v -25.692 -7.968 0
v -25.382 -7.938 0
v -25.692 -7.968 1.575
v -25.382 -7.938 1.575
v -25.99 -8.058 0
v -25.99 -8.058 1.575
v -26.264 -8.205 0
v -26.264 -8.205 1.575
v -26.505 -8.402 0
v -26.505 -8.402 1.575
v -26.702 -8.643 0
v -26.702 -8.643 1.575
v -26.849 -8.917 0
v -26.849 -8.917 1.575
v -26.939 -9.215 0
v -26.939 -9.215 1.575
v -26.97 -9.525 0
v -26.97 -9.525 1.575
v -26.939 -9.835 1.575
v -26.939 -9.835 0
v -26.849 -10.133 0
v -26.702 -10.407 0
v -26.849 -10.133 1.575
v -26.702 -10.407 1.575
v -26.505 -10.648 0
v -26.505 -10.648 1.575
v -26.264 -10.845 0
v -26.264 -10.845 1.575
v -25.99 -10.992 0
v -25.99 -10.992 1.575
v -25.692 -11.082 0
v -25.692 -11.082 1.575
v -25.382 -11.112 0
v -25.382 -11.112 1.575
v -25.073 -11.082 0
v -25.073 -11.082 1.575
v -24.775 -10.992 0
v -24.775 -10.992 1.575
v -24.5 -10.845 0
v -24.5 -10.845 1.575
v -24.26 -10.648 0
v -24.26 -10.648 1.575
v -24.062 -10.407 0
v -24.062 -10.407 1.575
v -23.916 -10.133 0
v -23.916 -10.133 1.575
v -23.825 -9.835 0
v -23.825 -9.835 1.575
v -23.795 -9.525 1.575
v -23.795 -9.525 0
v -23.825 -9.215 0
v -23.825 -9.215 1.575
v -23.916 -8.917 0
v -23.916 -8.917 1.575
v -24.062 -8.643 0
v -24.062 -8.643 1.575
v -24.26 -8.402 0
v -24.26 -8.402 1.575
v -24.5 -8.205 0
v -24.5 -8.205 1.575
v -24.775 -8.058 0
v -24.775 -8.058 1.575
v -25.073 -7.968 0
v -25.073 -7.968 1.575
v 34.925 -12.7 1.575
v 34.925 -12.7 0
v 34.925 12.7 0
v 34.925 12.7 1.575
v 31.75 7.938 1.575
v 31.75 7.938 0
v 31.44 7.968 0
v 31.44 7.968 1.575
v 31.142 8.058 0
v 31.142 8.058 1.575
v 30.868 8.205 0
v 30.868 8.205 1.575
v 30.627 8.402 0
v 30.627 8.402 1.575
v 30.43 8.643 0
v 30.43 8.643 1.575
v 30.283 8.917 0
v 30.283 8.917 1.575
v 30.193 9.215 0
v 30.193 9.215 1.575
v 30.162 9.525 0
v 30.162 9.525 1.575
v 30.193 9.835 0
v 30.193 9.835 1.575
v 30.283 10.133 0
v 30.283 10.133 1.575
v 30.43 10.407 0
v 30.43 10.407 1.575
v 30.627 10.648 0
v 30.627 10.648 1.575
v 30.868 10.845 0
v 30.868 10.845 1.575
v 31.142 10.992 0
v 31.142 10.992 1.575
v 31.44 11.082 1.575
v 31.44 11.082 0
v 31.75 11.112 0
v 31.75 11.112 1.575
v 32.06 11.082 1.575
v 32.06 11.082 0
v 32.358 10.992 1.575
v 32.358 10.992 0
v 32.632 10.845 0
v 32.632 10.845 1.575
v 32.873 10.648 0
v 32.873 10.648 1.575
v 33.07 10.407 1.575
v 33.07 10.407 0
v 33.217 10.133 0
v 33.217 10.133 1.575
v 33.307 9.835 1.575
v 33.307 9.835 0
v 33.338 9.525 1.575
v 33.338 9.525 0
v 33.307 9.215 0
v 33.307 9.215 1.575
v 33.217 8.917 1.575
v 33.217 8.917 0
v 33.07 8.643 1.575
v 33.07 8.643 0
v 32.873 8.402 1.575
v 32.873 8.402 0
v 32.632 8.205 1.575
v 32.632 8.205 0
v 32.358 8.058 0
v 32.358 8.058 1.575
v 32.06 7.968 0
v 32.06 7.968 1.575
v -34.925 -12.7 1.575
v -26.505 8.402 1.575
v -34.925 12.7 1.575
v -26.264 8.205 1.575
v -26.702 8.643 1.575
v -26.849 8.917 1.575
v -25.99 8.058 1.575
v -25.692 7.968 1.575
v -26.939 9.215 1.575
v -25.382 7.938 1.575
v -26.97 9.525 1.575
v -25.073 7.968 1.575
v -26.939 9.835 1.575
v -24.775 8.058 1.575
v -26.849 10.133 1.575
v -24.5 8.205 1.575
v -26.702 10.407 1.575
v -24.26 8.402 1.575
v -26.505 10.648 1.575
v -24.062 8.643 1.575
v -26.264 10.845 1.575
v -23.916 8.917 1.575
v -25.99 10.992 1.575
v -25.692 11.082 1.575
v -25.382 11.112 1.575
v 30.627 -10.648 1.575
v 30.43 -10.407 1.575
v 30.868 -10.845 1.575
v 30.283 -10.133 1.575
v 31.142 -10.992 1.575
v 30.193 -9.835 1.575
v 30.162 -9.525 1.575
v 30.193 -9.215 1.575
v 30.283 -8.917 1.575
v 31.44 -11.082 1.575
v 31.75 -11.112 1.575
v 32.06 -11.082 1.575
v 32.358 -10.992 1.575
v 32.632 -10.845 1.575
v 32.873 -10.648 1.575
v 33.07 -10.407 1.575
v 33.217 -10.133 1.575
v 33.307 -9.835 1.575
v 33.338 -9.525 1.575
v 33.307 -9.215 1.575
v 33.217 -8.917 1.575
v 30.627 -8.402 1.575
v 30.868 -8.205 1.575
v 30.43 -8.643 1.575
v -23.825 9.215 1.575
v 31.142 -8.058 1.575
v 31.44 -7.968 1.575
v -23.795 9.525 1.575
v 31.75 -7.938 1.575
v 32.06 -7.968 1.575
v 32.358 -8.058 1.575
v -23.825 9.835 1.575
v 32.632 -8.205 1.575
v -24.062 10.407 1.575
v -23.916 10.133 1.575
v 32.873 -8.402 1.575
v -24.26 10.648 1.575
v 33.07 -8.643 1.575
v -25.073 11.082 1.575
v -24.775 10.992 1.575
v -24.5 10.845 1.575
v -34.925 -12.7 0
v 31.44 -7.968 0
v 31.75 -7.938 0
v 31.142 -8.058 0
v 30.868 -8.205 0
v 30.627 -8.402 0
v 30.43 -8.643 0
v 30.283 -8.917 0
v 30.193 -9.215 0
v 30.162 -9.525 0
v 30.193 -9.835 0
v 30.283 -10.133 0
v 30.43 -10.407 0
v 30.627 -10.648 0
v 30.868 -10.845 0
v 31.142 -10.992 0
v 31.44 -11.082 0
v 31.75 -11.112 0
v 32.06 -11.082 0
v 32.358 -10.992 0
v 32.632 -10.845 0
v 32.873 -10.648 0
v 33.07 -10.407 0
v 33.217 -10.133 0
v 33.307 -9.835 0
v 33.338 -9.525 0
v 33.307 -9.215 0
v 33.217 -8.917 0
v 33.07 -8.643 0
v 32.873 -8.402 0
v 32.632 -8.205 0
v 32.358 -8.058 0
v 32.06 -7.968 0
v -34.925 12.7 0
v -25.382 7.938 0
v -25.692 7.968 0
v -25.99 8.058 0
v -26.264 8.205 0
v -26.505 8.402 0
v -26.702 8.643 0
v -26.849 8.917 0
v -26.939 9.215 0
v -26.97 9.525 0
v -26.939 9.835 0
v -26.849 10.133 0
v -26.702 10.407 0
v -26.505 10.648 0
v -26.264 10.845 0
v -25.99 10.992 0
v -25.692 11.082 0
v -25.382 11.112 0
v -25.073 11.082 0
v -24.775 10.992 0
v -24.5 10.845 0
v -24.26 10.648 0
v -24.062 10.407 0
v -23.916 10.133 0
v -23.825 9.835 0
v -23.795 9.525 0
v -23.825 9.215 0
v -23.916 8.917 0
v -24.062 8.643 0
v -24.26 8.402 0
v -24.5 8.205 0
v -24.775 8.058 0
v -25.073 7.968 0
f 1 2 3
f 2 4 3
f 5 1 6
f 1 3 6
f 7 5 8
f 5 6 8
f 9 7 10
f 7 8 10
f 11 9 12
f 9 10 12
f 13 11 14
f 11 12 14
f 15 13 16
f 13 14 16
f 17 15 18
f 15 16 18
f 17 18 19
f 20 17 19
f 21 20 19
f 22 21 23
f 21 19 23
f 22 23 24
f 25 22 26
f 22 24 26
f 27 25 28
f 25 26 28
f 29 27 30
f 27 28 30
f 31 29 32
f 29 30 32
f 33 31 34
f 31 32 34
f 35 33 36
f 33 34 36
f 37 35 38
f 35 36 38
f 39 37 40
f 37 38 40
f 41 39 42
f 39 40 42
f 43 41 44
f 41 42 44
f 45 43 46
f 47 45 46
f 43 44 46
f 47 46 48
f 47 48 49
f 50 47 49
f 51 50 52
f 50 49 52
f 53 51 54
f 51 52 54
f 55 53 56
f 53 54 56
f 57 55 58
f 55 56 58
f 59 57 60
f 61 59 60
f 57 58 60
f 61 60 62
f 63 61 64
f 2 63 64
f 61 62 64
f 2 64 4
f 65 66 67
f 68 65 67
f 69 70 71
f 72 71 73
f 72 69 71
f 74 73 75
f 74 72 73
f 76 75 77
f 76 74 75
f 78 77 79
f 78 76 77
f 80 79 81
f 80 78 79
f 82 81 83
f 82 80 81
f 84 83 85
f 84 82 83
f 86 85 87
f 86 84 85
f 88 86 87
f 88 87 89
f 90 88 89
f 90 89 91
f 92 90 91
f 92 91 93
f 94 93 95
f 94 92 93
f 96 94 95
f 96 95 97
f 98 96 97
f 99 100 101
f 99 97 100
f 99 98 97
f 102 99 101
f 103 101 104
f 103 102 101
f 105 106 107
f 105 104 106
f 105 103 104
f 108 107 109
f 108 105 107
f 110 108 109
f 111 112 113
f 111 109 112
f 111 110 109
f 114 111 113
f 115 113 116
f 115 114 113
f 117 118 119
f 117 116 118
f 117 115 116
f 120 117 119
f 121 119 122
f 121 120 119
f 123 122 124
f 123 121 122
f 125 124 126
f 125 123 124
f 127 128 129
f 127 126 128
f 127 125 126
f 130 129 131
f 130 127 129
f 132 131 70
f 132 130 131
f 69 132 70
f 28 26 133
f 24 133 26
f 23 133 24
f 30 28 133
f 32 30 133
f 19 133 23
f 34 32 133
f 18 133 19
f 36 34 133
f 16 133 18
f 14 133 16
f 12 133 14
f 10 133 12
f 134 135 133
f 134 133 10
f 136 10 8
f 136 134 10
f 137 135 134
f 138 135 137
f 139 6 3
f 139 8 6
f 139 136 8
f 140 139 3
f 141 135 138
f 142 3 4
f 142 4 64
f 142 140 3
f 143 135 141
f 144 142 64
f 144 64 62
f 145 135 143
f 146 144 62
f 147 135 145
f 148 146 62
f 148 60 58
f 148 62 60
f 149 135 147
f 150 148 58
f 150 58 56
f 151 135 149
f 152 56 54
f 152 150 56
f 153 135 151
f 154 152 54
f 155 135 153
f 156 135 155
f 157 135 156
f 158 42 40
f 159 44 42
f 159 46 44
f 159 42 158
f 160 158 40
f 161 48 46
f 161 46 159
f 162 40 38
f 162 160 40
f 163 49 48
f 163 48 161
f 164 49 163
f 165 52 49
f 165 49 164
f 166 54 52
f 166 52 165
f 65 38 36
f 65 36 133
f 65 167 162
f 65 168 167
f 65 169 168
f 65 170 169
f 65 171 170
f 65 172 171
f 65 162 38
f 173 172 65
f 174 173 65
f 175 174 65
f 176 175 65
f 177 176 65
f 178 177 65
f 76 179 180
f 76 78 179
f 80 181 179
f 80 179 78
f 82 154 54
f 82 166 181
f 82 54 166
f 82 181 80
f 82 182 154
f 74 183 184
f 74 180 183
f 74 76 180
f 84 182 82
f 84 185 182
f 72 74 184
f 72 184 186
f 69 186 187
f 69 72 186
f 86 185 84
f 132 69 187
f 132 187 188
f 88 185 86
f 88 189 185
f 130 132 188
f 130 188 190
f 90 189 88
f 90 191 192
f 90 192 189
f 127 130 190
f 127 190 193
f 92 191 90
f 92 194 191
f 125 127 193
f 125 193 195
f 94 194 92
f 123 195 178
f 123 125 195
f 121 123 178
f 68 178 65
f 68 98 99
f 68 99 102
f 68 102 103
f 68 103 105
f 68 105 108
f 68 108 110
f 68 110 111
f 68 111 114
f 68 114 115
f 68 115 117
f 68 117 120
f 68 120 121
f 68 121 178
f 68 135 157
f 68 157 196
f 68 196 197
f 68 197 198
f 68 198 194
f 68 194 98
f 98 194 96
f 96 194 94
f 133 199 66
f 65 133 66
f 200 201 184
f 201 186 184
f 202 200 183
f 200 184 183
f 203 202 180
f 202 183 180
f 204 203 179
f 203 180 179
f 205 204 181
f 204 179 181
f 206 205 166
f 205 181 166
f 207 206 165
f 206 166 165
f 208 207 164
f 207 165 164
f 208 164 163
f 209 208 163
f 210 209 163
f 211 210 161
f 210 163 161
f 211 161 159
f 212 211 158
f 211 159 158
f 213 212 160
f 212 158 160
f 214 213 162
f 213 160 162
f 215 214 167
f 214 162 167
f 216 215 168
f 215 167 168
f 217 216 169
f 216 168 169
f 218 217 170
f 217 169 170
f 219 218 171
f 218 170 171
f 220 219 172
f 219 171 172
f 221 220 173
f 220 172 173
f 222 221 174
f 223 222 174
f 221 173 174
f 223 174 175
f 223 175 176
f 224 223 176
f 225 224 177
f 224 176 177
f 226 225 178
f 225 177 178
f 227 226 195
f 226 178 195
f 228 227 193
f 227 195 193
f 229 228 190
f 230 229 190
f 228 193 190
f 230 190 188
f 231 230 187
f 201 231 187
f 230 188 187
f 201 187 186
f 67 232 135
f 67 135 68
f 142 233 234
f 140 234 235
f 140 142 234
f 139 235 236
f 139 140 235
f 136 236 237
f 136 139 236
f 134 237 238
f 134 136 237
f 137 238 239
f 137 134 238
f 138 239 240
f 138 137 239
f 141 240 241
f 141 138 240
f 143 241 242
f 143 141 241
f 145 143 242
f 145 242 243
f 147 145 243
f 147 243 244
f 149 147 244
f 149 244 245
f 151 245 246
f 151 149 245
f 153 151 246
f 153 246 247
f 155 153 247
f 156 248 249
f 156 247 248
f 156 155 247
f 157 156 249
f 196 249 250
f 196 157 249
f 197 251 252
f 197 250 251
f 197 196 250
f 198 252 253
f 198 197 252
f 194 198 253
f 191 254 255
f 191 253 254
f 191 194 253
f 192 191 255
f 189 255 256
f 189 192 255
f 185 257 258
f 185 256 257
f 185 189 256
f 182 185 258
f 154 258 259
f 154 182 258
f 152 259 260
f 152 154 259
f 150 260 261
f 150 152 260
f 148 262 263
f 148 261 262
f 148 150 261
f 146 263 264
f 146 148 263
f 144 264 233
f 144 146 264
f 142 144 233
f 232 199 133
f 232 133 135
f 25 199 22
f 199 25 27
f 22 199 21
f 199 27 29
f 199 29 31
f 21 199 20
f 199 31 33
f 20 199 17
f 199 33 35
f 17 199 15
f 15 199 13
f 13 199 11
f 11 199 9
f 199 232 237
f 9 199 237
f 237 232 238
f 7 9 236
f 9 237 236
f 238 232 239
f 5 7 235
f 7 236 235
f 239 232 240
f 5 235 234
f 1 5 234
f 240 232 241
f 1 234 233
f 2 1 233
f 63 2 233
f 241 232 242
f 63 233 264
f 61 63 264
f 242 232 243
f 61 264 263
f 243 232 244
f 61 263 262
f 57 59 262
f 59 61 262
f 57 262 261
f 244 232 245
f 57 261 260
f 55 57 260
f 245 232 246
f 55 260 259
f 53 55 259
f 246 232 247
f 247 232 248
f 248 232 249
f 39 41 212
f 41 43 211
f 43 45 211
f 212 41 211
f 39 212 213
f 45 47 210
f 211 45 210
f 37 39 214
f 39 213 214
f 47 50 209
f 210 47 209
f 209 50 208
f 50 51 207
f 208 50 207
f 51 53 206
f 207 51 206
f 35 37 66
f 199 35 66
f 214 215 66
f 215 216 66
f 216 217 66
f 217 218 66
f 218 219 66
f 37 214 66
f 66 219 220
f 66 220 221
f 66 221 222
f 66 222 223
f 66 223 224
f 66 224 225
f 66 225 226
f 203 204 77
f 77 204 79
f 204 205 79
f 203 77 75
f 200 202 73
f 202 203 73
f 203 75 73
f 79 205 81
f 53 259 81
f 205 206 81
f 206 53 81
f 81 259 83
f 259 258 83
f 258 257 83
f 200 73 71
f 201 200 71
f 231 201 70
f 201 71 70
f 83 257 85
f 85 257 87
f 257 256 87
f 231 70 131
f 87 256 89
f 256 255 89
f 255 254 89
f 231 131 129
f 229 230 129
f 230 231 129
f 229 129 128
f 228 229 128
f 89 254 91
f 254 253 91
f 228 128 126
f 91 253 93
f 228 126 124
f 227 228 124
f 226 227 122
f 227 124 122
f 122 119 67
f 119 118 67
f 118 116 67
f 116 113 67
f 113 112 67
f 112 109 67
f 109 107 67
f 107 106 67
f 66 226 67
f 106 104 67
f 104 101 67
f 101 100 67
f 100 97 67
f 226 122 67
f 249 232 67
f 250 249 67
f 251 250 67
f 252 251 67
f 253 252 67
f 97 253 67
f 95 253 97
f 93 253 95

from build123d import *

# Parameters (mm, degrees)
SKETCH1_W                             = 69.85
SKETCH1_H                             = 25.4
EXTRUDE1_DEPTH                        = 1.5748
F_1_8_0_125_DIAMETER_HOLE1_AT_2_COUNT = 2
F_1_8_0_125_DIAMETER_HOLE1_AT_2_PITCH = 57.13222


with BuildPart() as part:
    # Sketch1 → Extrude1 (new body)
    with BuildSketch(Plane.XY):
        Rectangle(SKETCH1_W, SKETCH1_H)
    extrude(amount=EXTRUDE1_DEPTH)

    # Sketch3 → 1/8 (0.125) Diameter Hole1 (revolve, cut)
    with BuildSketch(Plane(origin=(-25.38222, 9.525, 1.5748), x_dir=(0, -1, 0), z_dir=(1, 0, 0))):
        Polygon((0, 0), (0, 16.955866233), (1.5875, 16.002), (1.5875, 0), align=None)
    f_1_8_0_125_diameter_hole1 = revolve(axis=Axis((-25.38222, 9.525, 7.9248), (0, 0, -1)), mode=Mode.SUBTRACT)

    # 1/8 (0.125) Diameter Hole1 at 2: 1/8 (0.125) Diameter Hole1 ×2
    with Locations(*[(i * F_1_8_0_125_DIAMETER_HOLE1_AT_2_PITCH, 0, 0) for i in range(1, F_1_8_0_125_DIAMETER_HOLE1_AT_2_COUNT)]):
        add(f_1_8_0_125_diameter_hole1, mode=Mode.SUBTRACT)

    # Mirror1: 1/8 (0.125) Diameter Hole1 across plane
    add(f_1_8_0_125_diameter_hole1.mirror(Plane.ZX), mode=Mode.SUBTRACT)

    # Mirror1 copy 1 sketch → Mirror1 copy 1 (revolve, cut)
    with BuildSketch(Plane(origin=(31.75, -9.525, 1.5748), x_dir=(0, 1, 0), z_dir=(1, 0, 0))):
        Polygon((0, 0), (0, -16.955866233), (1.5875, -16.002), (1.5875, 0), align=None)
    revolve(axis=Axis((31.75, -9.525, 7.9248), (0, 0, 1)), mode=Mode.SUBTRACT)


solid = part.part
